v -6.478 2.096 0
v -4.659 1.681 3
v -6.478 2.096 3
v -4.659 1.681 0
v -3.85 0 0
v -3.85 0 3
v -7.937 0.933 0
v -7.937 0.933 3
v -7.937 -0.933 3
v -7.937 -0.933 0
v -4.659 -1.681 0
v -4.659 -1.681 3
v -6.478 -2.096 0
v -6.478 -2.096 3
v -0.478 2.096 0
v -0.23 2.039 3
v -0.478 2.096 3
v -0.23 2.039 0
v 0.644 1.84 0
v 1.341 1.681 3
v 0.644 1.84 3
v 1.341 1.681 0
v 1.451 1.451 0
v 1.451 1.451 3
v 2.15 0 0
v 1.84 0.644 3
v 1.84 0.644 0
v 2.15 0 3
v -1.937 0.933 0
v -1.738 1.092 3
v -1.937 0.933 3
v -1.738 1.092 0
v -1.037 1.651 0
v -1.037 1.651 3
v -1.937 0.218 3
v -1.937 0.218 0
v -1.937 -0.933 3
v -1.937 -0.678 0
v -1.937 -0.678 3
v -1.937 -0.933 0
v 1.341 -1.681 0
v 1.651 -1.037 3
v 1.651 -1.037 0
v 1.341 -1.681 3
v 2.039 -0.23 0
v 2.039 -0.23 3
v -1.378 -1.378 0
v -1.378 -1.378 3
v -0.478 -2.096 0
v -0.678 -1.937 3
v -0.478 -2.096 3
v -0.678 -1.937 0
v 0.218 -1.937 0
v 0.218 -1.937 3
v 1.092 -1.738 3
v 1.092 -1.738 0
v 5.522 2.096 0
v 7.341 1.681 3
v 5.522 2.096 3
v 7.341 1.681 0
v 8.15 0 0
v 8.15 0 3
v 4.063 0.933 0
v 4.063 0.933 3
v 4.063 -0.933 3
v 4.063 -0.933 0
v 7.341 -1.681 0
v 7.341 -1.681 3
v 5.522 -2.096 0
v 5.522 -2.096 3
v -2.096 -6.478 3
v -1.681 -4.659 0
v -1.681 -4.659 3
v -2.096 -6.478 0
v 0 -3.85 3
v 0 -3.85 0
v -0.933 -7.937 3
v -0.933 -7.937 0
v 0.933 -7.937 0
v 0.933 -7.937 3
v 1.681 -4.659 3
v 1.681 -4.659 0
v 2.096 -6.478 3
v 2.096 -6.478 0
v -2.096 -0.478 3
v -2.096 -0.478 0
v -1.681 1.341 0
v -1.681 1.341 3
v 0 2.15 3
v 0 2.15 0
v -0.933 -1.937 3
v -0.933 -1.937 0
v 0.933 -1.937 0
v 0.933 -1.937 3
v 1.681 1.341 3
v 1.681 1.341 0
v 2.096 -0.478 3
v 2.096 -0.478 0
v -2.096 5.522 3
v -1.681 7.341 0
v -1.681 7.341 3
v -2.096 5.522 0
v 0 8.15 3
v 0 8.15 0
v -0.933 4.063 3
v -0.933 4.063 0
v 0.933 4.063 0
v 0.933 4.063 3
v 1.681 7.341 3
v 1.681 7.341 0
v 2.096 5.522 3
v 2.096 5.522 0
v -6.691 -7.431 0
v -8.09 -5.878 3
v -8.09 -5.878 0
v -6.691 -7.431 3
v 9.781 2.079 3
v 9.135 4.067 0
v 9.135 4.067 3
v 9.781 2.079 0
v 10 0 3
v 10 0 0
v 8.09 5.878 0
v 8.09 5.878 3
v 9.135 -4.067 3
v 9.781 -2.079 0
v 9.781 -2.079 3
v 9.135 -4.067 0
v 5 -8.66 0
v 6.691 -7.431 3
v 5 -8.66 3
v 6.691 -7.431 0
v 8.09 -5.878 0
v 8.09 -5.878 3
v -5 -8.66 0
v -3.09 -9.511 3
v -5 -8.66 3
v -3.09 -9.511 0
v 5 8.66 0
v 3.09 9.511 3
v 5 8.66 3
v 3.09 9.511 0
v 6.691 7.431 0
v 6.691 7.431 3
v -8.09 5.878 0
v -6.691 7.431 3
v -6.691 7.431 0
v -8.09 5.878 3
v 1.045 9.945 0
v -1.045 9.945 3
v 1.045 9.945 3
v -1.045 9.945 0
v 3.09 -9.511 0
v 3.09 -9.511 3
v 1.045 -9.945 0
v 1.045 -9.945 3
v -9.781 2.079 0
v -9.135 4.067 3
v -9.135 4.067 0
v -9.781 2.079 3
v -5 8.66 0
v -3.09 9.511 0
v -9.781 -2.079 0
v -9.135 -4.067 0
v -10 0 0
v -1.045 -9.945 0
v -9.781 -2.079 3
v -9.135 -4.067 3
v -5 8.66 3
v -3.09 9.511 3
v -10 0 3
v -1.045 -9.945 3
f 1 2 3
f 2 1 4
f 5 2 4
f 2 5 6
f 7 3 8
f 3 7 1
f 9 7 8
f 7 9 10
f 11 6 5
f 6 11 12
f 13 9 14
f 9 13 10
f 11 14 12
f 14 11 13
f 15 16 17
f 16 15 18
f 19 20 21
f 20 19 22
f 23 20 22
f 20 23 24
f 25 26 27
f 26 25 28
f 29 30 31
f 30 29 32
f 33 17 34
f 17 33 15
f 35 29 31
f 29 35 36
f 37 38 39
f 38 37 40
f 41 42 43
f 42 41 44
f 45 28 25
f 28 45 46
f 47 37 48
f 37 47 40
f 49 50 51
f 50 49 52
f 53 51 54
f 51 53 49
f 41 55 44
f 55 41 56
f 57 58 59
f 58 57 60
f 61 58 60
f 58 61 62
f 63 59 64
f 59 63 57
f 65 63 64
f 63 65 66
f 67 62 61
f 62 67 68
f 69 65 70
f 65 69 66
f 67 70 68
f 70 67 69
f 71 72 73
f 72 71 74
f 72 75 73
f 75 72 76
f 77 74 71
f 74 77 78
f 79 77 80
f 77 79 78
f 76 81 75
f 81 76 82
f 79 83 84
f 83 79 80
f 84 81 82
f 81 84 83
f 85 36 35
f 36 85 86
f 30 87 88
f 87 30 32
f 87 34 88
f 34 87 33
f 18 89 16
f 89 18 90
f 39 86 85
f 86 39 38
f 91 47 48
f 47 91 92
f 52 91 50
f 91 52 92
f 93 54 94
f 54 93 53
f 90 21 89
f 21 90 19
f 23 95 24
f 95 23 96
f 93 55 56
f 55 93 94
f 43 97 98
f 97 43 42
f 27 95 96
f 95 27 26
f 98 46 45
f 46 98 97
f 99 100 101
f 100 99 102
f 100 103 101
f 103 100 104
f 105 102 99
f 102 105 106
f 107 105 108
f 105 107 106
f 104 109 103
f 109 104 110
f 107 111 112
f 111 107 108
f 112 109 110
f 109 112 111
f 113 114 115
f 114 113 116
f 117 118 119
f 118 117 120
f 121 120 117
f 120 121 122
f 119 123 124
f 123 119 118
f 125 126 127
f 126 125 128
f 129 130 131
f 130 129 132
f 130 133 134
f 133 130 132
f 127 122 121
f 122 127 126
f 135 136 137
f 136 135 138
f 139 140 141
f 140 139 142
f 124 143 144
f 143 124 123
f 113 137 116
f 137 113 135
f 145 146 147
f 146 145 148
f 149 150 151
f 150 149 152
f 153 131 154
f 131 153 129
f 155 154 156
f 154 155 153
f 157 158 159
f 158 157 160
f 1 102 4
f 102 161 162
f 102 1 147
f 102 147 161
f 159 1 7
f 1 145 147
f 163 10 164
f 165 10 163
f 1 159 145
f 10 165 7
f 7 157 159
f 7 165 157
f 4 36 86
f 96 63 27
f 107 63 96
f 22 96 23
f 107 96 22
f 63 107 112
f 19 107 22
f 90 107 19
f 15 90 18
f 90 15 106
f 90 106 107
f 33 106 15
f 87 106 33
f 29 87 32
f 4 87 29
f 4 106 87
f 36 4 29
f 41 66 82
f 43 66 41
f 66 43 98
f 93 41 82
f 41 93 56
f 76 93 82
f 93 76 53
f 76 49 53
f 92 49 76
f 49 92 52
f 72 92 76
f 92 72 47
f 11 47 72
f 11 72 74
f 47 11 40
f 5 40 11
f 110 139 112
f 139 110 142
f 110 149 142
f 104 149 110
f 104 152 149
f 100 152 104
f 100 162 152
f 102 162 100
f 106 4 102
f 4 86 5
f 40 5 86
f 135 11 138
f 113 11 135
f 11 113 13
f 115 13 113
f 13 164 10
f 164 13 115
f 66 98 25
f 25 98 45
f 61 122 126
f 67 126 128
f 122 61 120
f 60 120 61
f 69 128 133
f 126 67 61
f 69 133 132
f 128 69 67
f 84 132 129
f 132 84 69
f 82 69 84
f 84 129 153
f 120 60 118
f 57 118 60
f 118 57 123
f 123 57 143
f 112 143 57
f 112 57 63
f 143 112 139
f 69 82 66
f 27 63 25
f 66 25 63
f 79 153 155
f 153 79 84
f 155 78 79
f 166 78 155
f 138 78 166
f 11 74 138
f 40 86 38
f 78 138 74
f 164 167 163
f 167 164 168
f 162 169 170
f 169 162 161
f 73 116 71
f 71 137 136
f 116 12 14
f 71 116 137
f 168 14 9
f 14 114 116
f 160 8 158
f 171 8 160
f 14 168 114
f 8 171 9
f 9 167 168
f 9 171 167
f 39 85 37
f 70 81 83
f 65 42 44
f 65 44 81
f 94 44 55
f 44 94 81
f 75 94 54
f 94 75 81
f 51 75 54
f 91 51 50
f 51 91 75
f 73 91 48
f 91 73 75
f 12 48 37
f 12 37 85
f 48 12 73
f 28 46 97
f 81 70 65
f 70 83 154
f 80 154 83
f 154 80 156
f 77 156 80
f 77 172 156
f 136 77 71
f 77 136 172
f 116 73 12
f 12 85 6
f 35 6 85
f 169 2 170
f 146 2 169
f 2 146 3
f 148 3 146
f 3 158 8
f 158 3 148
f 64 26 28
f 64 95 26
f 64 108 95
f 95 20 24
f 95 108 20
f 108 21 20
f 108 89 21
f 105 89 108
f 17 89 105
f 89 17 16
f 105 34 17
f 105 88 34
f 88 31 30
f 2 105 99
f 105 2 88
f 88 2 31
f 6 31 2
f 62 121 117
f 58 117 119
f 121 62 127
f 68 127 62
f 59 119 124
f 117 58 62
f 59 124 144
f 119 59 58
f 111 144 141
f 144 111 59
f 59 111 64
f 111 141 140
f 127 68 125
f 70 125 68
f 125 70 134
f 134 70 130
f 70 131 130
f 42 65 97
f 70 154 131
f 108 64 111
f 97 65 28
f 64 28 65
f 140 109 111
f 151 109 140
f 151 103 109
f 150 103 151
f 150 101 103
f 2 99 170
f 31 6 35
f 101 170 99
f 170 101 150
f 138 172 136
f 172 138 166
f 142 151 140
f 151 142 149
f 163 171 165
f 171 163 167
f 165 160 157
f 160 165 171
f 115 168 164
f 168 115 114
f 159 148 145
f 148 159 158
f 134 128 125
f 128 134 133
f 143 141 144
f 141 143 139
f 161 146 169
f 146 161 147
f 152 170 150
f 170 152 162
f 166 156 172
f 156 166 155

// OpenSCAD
// file: ollo.scad
// Diameter of plastic ollo holes
OlloHoles = 4.3;

// Width of Ollo "real" plastic
OlloWidth = 3;

// Distance between two ollo holes
OlloSpacing = 6;

// Do an Ollo hole on the part
module olloHole(depth=2.2)
{
    translate([0,0,-0.1])
      cylinder(depth+0.2, OlloHoles/2, OlloHoles/2);
}

// Do 3 ollo holes
module threeOllo(depth=2.2)
{
  for (xy=[[-OlloSpacing,0],[0,0],[OlloSpacing,0]]) {
    translate([xy[0], xy[1], 0])
    olloHole(depth);
  }
}

// Do a servo arm holes
module servoArm(depth=2.2)
{
    threeOllo(depth);
    rotate([0,0,90])
      threeOllo(depth);
}
// main file
include <ollo.scad>;

module arm(counter=false) {
    c = counter?[0.6,0.6,0.6]:[0.15,0.15,0.15];
    color(c) {
        difference() {
            cylinder(d=20, h=OlloWidth);
            servoArm(OlloWidth);
        }
    }
}

arm();
